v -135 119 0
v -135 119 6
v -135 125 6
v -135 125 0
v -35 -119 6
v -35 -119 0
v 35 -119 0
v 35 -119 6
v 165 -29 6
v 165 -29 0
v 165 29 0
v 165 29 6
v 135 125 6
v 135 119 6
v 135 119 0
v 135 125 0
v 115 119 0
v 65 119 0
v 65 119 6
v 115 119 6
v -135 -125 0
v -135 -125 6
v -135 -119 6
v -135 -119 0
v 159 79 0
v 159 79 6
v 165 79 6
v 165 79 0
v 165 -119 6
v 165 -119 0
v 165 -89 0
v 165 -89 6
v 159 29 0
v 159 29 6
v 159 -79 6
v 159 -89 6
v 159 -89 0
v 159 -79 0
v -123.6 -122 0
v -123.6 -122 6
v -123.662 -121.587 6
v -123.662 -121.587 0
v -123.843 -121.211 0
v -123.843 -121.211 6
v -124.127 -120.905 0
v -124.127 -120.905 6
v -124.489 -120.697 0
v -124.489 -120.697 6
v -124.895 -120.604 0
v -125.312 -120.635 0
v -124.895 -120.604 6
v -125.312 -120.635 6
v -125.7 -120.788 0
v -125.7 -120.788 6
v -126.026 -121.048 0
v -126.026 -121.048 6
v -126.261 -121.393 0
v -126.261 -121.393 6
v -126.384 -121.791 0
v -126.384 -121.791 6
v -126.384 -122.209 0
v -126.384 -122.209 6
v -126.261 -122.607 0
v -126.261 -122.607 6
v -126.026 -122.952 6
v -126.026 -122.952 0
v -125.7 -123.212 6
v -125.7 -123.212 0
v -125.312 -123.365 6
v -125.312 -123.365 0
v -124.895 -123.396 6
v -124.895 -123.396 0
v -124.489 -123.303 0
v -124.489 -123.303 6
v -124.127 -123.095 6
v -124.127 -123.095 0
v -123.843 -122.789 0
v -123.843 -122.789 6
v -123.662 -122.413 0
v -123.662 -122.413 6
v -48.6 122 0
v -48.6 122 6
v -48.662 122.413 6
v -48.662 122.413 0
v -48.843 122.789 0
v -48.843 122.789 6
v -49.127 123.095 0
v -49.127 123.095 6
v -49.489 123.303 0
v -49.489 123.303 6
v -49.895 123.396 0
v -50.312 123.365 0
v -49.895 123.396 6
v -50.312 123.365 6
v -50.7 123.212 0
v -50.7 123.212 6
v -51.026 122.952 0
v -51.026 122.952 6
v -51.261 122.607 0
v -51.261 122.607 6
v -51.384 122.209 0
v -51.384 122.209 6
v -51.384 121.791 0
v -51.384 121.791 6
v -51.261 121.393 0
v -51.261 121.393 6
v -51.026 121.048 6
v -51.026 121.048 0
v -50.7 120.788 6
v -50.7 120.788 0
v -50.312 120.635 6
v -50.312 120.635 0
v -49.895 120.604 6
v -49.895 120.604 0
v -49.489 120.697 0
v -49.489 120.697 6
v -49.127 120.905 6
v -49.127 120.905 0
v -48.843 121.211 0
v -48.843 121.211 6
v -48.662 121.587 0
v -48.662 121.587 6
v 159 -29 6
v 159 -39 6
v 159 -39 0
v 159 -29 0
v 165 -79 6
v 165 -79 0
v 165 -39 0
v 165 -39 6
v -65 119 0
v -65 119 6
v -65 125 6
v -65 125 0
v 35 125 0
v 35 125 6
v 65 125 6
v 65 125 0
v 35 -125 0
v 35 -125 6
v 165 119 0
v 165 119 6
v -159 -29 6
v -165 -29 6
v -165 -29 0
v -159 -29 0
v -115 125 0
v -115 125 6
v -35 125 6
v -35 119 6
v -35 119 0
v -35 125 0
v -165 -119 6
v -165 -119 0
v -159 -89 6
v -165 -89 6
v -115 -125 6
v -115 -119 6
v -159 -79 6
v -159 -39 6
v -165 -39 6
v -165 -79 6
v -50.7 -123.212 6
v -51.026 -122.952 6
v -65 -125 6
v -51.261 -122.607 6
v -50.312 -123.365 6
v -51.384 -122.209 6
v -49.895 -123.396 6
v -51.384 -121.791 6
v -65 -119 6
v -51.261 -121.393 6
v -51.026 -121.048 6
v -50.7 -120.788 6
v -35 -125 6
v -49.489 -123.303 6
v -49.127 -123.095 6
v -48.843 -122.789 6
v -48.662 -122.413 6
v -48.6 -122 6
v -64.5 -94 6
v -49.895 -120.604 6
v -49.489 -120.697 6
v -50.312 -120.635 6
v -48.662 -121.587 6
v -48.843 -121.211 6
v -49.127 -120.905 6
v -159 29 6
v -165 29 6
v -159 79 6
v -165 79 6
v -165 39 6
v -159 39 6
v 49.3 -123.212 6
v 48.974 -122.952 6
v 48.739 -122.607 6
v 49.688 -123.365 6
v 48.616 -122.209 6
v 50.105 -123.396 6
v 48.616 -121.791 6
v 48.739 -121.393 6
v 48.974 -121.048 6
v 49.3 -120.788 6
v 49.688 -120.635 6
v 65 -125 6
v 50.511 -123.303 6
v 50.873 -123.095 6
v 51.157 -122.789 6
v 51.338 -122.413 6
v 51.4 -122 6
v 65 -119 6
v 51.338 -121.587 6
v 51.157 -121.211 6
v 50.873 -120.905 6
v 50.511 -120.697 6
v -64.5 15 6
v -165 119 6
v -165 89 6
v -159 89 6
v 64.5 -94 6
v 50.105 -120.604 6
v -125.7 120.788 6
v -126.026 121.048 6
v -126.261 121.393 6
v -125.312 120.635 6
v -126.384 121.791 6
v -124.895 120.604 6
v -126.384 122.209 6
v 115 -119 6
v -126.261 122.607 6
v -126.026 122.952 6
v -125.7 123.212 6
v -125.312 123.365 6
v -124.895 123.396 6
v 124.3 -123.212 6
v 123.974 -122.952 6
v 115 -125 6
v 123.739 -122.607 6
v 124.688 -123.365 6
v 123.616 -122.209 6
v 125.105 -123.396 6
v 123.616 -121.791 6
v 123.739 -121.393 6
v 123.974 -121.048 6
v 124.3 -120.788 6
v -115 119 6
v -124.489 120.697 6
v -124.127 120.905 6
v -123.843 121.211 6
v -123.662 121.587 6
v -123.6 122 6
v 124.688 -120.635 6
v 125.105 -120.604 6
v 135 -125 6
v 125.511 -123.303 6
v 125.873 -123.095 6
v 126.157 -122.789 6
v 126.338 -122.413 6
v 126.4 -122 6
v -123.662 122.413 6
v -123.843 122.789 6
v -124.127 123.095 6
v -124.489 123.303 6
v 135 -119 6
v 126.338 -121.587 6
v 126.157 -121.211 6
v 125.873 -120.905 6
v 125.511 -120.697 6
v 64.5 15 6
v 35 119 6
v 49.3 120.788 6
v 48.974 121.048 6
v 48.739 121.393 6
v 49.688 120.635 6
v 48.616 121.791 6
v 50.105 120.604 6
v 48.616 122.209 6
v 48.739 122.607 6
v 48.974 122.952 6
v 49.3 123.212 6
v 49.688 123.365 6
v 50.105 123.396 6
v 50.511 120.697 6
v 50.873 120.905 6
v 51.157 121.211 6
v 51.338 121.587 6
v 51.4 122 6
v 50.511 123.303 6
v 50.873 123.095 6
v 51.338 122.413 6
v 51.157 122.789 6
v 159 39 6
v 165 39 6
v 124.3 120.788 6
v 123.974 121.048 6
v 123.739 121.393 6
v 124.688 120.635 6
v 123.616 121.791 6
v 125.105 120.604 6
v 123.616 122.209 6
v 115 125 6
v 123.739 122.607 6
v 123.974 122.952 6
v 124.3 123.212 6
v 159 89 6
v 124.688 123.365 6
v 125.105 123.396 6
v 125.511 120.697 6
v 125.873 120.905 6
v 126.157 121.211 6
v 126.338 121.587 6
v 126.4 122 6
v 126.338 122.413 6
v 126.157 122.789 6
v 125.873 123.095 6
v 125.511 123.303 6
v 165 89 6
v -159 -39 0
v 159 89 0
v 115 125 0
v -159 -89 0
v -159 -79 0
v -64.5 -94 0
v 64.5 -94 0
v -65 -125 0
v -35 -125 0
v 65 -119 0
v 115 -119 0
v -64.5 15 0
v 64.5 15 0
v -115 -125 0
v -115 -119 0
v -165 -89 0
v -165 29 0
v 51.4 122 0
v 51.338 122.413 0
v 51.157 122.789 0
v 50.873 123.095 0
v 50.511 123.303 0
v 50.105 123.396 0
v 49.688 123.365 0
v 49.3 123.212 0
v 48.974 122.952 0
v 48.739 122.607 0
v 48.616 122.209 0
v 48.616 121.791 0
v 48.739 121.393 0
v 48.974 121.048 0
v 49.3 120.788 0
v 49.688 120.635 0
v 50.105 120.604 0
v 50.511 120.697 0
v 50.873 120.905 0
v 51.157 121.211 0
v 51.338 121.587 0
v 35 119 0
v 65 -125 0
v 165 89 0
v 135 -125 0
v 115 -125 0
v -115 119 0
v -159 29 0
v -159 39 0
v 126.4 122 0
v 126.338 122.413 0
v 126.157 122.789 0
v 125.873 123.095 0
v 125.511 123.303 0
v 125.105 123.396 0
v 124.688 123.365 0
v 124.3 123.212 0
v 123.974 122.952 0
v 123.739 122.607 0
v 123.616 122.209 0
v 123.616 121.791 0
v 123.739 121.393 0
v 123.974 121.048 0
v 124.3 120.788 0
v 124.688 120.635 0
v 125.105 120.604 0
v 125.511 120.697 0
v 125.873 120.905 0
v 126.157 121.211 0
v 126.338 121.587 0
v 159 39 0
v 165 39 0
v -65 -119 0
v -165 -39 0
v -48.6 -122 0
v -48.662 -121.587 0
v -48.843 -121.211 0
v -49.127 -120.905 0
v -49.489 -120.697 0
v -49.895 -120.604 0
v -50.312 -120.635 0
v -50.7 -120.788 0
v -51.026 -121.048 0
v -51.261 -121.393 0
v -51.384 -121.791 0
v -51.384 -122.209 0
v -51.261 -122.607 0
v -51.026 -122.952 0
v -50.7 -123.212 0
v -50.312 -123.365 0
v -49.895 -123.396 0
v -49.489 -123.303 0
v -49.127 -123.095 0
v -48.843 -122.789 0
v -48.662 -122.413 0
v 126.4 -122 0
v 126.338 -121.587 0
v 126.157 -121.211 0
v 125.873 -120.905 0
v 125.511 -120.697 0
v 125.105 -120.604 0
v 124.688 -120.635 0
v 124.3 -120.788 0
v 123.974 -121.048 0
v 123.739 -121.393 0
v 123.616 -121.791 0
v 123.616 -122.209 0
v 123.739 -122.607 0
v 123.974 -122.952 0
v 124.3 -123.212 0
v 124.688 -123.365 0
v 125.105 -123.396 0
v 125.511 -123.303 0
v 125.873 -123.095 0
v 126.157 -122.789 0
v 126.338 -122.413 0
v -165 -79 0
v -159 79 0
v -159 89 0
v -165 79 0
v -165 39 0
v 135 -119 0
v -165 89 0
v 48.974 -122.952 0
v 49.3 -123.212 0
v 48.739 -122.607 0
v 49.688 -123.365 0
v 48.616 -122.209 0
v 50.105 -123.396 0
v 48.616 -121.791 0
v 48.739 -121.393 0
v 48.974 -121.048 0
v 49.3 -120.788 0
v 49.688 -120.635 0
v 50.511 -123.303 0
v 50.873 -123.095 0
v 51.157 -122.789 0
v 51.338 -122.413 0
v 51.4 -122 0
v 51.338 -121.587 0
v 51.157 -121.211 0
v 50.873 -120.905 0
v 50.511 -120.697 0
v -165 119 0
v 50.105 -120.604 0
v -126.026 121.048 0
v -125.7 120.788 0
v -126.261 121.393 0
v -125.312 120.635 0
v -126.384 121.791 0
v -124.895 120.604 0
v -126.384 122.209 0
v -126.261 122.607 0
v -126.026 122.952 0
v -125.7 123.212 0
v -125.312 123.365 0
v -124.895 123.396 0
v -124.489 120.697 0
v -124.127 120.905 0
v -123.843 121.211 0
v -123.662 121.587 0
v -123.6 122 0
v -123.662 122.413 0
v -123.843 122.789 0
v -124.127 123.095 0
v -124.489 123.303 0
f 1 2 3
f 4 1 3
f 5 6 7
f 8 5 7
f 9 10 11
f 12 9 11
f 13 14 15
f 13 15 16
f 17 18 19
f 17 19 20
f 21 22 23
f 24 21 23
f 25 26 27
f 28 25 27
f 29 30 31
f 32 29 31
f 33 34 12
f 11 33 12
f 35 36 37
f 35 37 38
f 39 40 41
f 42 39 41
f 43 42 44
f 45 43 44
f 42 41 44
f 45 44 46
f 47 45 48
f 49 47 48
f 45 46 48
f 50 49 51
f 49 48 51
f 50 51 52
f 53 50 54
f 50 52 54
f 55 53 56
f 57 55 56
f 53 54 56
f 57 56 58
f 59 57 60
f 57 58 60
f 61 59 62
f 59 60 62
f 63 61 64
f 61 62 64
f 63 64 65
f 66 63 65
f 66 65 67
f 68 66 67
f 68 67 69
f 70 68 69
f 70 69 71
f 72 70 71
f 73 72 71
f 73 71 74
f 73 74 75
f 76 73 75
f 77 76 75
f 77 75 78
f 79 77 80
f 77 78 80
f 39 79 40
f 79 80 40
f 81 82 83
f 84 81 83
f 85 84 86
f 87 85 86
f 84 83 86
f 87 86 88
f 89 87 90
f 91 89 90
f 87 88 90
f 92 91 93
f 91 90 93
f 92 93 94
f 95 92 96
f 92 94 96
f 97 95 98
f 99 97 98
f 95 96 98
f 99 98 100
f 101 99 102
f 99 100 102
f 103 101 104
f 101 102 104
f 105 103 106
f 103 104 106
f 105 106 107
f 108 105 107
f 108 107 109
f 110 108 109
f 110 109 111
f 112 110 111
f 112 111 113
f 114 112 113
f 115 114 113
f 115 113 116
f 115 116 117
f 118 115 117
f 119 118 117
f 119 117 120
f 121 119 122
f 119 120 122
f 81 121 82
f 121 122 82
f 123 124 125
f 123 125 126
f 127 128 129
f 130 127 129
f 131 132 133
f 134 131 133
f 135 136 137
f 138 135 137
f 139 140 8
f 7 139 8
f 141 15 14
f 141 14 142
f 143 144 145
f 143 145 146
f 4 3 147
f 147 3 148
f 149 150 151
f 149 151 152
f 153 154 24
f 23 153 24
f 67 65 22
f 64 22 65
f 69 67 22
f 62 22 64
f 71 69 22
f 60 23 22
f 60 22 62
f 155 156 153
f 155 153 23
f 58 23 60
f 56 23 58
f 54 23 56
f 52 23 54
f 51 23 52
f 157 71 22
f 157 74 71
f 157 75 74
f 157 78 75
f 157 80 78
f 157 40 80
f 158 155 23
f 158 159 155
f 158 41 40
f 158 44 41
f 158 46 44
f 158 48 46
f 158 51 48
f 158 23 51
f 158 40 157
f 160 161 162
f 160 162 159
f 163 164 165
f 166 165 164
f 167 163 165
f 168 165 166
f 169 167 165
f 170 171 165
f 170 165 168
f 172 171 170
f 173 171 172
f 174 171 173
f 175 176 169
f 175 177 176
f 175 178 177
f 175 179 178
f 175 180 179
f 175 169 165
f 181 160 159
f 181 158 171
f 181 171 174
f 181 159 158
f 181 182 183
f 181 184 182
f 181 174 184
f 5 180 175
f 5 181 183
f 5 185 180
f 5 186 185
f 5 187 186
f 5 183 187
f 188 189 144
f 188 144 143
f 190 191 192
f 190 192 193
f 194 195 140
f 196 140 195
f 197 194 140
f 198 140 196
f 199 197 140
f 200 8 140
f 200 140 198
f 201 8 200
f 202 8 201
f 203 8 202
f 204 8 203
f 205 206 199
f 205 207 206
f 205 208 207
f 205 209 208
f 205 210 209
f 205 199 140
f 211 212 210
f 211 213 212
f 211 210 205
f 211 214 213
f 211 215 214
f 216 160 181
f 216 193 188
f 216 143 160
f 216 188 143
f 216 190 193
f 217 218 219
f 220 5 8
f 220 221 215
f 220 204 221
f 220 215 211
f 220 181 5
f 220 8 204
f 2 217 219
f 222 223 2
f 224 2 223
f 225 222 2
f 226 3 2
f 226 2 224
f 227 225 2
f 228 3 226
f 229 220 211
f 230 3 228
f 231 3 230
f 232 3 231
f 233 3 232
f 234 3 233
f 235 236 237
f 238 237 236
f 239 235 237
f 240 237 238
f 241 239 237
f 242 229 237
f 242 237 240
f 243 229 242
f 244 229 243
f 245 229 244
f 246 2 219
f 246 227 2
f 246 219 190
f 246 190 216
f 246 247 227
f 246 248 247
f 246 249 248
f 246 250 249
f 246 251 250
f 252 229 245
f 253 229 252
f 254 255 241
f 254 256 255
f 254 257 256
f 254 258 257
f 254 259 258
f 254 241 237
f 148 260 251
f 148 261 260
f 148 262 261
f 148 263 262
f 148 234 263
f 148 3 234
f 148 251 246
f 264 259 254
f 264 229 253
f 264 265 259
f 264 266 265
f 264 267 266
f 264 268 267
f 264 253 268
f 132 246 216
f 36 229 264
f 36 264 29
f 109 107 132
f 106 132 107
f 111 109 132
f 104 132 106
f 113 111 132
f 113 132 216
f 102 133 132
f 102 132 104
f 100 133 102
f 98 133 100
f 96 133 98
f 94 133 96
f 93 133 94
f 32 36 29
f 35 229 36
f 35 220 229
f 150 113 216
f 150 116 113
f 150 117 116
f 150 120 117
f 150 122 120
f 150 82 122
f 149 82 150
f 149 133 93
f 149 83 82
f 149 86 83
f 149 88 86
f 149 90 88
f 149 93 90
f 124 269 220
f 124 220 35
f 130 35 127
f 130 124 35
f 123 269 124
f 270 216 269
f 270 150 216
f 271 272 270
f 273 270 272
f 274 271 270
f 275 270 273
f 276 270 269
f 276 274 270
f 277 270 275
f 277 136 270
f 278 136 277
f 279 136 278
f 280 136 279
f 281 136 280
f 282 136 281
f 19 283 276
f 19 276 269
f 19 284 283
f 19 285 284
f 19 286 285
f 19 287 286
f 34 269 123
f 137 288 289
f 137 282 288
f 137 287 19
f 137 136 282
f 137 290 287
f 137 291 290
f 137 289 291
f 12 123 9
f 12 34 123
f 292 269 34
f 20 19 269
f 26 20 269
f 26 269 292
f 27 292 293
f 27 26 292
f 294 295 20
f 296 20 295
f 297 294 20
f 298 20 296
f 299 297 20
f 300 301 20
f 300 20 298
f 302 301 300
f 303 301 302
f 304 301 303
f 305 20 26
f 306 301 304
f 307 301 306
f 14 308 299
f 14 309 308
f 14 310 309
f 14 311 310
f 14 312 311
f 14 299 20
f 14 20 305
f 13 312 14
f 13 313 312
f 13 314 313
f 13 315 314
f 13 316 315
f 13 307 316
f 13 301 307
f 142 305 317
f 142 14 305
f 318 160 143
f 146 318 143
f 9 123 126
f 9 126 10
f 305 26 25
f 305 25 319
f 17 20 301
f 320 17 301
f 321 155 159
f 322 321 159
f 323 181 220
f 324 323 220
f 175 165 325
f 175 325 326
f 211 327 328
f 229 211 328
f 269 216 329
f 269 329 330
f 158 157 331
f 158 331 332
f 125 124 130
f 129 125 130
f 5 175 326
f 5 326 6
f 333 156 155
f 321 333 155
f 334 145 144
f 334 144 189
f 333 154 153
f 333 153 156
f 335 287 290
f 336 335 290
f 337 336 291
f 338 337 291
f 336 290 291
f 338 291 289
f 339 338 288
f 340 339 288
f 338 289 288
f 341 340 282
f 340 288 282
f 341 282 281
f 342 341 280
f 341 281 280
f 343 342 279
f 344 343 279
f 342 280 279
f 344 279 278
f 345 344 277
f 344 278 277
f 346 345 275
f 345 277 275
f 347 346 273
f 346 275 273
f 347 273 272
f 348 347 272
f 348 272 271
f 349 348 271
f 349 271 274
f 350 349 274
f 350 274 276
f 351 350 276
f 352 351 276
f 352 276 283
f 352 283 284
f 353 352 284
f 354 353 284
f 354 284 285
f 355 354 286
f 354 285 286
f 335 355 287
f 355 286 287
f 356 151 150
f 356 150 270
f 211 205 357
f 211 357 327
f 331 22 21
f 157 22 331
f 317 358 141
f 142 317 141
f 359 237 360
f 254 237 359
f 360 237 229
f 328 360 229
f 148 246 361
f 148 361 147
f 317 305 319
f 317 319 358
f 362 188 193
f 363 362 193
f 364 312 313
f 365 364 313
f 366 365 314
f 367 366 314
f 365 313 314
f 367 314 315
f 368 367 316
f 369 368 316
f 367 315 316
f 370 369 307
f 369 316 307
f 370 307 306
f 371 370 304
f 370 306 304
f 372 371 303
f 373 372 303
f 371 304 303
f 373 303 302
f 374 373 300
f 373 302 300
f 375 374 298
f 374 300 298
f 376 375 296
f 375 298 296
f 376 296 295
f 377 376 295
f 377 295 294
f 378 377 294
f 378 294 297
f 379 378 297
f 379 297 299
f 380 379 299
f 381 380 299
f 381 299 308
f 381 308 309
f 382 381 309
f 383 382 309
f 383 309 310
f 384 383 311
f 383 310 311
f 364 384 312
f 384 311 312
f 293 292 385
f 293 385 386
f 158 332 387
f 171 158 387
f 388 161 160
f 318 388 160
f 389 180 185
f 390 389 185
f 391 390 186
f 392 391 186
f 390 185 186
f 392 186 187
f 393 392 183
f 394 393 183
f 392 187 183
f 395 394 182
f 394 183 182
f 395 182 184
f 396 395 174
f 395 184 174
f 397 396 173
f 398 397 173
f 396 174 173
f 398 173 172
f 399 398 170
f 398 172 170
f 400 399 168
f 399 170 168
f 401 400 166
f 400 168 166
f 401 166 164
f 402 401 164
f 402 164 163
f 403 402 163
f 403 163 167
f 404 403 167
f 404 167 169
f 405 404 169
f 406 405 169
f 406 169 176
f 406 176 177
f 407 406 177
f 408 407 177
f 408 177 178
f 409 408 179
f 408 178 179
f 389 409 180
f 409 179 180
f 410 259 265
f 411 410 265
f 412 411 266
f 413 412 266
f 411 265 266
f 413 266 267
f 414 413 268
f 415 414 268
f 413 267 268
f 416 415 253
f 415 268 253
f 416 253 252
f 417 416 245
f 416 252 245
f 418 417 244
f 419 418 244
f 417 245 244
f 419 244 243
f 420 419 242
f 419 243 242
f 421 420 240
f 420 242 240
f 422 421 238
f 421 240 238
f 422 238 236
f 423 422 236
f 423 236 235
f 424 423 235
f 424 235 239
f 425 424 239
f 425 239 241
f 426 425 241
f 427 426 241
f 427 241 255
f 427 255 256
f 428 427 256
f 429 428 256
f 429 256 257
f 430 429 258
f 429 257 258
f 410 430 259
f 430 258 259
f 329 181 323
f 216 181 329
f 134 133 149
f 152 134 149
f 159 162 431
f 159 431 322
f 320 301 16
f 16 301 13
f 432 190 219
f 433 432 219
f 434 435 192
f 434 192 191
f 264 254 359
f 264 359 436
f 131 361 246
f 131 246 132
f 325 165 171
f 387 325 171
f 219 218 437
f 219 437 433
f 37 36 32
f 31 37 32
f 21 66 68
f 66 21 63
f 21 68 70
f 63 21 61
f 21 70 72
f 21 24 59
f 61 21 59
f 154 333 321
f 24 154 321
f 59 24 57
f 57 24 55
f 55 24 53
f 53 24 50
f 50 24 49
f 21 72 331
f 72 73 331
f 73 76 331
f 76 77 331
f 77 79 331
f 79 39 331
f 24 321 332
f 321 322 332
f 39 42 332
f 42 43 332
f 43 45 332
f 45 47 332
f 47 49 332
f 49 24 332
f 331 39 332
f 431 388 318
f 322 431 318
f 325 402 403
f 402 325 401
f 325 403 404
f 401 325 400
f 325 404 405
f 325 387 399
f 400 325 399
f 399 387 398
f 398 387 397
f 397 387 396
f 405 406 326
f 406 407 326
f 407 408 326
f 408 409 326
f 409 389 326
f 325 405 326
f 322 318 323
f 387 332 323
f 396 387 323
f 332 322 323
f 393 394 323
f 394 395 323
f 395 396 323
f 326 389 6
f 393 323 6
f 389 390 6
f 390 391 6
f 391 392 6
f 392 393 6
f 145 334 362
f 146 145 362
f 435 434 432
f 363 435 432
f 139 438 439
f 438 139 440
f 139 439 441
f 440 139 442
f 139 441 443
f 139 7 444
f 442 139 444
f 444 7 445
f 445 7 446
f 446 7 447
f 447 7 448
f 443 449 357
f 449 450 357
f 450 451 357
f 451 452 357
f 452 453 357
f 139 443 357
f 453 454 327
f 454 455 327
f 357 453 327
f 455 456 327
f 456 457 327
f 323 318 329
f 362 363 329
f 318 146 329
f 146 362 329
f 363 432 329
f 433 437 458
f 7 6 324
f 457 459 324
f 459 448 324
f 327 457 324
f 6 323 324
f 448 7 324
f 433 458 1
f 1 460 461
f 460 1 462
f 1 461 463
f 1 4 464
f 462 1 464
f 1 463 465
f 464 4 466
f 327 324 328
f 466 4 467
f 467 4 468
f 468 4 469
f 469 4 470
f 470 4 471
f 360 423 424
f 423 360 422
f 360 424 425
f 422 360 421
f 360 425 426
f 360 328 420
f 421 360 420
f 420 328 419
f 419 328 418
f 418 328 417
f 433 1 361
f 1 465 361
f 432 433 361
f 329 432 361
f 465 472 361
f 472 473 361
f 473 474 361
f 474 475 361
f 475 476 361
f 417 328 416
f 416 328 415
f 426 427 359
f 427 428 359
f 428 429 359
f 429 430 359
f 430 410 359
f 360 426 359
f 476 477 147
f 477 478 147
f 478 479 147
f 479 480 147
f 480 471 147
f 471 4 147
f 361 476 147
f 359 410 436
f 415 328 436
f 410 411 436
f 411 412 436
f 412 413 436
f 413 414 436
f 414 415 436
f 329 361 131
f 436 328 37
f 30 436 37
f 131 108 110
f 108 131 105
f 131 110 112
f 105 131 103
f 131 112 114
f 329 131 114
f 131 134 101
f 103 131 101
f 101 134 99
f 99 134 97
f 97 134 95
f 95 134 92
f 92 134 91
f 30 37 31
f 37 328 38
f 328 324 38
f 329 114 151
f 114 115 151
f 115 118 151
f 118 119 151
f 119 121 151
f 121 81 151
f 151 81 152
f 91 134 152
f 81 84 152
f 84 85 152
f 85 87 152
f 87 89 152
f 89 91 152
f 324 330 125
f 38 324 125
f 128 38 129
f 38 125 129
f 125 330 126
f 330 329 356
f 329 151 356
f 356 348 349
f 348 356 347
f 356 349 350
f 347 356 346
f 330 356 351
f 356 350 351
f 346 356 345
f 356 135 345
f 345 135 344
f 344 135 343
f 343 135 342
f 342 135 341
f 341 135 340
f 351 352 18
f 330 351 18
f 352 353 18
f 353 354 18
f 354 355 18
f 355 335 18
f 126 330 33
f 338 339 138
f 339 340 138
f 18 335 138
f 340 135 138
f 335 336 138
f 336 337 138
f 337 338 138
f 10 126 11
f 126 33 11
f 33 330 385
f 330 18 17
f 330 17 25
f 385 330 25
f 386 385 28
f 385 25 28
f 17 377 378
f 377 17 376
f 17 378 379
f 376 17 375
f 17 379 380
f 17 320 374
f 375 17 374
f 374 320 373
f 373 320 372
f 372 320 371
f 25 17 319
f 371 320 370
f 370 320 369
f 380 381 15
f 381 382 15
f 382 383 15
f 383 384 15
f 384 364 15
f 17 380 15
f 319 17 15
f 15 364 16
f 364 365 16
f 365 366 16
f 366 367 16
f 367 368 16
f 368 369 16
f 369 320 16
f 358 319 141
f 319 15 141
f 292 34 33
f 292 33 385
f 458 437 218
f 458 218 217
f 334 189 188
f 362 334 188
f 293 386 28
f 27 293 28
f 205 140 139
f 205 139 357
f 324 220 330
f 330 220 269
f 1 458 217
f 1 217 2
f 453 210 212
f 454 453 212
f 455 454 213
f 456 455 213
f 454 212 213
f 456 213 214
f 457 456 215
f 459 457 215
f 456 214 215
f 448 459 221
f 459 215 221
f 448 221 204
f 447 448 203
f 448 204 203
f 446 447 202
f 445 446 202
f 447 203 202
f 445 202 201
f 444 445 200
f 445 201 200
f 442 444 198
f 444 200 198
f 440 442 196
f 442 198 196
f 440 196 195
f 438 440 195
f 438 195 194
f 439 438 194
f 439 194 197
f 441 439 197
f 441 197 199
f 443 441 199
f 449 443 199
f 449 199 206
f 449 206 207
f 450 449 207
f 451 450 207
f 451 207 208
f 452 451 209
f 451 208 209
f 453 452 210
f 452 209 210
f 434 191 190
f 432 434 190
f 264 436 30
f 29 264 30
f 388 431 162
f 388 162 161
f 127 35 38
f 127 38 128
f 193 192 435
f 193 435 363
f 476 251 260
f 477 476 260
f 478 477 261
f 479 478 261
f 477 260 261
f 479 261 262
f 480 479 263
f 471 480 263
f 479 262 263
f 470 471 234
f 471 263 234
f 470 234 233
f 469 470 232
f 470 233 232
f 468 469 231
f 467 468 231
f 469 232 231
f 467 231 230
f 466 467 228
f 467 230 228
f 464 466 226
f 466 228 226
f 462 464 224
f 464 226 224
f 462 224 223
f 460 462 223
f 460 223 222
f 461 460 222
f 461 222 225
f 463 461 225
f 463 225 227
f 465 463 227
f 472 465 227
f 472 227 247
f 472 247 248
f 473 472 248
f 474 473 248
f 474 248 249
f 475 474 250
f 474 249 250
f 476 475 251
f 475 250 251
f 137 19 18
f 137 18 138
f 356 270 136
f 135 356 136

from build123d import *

# Parameters (mm, degrees)
ESQUISSE1_W             = 330
ESQUISSE1_H             = 238
BOSS_EXTRU_1_DEPTH      = 6
ESQUISSE2_W             = 129
ESQUISSE2_H             = 109
ENL_V_MAT_EXTRU_1_DEPTH = 6
ESQUISSE3_W             = 20
ESQUISSE3_H             = 6
ESQUISSE3_W_2           = 30
BOSS_EXTRU_4_DEPTH      = 6
ESQUISSE4_W             = 6
ESQUISSE4_H             = 10
ENL_V_MAT_EXTRU_3_DEPTH = 6
ESQUISSE5_R             = 1.4
ENL_V_MAT_EXTRU_4_DEPTH = 6


with BuildPart() as part:
    # Esquisse1 → Boss.-Extru.1 (new body)
    with BuildSketch(Plane.XY):
        Rectangle(ESQUISSE1_W, ESQUISSE1_H)
    extrude(amount=BOSS_EXTRU_1_DEPTH)

    # Esquisse2 → Enlèv. mat.-Extru.1 (cut)
    with BuildSketch(Plane.XY.offset(6)):
        with Locations((0, -39.5)):
            Rectangle(ESQUISSE2_W, ESQUISSE2_H)
    extrude(amount=-ENL_V_MAT_EXTRU_1_DEPTH, mode=Mode.SUBTRACT)

    # Esquisse3 → Boss.-Extru.4 (add)
    with BuildSketch(Plane.XY.offset(6)):
        with Locations((-125, 122)):
            Rectangle(ESQUISSE3_W, ESQUISSE3_H)
        with Locations((-50, 122)):
            Rectangle(ESQUISSE3_W_2, ESQUISSE3_H)
        with Locations((50, 122)):
            Rectangle(ESQUISSE3_W_2, ESQUISSE3_H)
        with Locations((125, 122)):
            Rectangle(ESQUISSE3_W, ESQUISSE3_H)
        with Locations((125, -122)):
            Rectangle(ESQUISSE3_W, ESQUISSE3_H)
        with Locations((50, -122)):
            Rectangle(ESQUISSE3_W_2, ESQUISSE3_H)
        with Locations((-50, -122)):
            Rectangle(ESQUISSE3_W_2, ESQUISSE3_H)
        with Locations((-125, -122)):
            Rectangle(ESQUISSE3_W, ESQUISSE3_H)
    extrude(amount=-BOSS_EXTRU_4_DEPTH)

    # Esquisse4 → Enlèv. mat.-Extru.3 (cut)
    with BuildSketch(Plane.XY.offset(6)):
        with Locations((-162, 84)):
            Rectangle(ESQUISSE4_W, ESQUISSE4_H)
        with Locations((-162, 34)):
            Rectangle(ESQUISSE4_W, ESQUISSE4_H)
        with Locations((-162, -84)):
            Rectangle(ESQUISSE4_W, ESQUISSE4_H)
        with Locations((-162, -34)):
            Rectangle(ESQUISSE4_W, ESQUISSE4_H)
        with Locations((162, -84)):
            Rectangle(ESQUISSE4_W, ESQUISSE4_H)
        with Locations((162, -34)):
            Rectangle(ESQUISSE4_W, ESQUISSE4_H)
        with Locations((162, 34)):
            Rectangle(ESQUISSE4_W, ESQUISSE4_H)
        with Locations((162, 84)):
            Rectangle(ESQUISSE4_W, ESQUISSE4_H)
    extrude(amount=-ENL_V_MAT_EXTRU_3_DEPTH, mode=Mode.SUBTRACT)

    # Esquisse5 → Enlèv. mat.-Extru.4 (cut)
    with BuildSketch(Plane.XY.offset(6)):
        with Locations((-125, 122)):
            Circle(ESQUISSE5_R)
        with Locations((-50, 122)):
            Circle(ESQUISSE5_R)
        with Locations((50, 122)):
            Circle(ESQUISSE5_R)
        with Locations((125, 122)):
            Circle(ESQUISSE5_R)
        with Locations((125, -122)):
            Circle(ESQUISSE5_R)
        with Locations((50, -122)):
            Circle(ESQUISSE5_R)
        with Locations((-50, -122)):
            Circle(ESQUISSE5_R)
        with Locations((-125, -122)):
            Circle(ESQUISSE5_R)
    extrude(amount=-ENL_V_MAT_EXTRU_4_DEPTH, mode=Mode.SUBTRACT)


solid = part.part
